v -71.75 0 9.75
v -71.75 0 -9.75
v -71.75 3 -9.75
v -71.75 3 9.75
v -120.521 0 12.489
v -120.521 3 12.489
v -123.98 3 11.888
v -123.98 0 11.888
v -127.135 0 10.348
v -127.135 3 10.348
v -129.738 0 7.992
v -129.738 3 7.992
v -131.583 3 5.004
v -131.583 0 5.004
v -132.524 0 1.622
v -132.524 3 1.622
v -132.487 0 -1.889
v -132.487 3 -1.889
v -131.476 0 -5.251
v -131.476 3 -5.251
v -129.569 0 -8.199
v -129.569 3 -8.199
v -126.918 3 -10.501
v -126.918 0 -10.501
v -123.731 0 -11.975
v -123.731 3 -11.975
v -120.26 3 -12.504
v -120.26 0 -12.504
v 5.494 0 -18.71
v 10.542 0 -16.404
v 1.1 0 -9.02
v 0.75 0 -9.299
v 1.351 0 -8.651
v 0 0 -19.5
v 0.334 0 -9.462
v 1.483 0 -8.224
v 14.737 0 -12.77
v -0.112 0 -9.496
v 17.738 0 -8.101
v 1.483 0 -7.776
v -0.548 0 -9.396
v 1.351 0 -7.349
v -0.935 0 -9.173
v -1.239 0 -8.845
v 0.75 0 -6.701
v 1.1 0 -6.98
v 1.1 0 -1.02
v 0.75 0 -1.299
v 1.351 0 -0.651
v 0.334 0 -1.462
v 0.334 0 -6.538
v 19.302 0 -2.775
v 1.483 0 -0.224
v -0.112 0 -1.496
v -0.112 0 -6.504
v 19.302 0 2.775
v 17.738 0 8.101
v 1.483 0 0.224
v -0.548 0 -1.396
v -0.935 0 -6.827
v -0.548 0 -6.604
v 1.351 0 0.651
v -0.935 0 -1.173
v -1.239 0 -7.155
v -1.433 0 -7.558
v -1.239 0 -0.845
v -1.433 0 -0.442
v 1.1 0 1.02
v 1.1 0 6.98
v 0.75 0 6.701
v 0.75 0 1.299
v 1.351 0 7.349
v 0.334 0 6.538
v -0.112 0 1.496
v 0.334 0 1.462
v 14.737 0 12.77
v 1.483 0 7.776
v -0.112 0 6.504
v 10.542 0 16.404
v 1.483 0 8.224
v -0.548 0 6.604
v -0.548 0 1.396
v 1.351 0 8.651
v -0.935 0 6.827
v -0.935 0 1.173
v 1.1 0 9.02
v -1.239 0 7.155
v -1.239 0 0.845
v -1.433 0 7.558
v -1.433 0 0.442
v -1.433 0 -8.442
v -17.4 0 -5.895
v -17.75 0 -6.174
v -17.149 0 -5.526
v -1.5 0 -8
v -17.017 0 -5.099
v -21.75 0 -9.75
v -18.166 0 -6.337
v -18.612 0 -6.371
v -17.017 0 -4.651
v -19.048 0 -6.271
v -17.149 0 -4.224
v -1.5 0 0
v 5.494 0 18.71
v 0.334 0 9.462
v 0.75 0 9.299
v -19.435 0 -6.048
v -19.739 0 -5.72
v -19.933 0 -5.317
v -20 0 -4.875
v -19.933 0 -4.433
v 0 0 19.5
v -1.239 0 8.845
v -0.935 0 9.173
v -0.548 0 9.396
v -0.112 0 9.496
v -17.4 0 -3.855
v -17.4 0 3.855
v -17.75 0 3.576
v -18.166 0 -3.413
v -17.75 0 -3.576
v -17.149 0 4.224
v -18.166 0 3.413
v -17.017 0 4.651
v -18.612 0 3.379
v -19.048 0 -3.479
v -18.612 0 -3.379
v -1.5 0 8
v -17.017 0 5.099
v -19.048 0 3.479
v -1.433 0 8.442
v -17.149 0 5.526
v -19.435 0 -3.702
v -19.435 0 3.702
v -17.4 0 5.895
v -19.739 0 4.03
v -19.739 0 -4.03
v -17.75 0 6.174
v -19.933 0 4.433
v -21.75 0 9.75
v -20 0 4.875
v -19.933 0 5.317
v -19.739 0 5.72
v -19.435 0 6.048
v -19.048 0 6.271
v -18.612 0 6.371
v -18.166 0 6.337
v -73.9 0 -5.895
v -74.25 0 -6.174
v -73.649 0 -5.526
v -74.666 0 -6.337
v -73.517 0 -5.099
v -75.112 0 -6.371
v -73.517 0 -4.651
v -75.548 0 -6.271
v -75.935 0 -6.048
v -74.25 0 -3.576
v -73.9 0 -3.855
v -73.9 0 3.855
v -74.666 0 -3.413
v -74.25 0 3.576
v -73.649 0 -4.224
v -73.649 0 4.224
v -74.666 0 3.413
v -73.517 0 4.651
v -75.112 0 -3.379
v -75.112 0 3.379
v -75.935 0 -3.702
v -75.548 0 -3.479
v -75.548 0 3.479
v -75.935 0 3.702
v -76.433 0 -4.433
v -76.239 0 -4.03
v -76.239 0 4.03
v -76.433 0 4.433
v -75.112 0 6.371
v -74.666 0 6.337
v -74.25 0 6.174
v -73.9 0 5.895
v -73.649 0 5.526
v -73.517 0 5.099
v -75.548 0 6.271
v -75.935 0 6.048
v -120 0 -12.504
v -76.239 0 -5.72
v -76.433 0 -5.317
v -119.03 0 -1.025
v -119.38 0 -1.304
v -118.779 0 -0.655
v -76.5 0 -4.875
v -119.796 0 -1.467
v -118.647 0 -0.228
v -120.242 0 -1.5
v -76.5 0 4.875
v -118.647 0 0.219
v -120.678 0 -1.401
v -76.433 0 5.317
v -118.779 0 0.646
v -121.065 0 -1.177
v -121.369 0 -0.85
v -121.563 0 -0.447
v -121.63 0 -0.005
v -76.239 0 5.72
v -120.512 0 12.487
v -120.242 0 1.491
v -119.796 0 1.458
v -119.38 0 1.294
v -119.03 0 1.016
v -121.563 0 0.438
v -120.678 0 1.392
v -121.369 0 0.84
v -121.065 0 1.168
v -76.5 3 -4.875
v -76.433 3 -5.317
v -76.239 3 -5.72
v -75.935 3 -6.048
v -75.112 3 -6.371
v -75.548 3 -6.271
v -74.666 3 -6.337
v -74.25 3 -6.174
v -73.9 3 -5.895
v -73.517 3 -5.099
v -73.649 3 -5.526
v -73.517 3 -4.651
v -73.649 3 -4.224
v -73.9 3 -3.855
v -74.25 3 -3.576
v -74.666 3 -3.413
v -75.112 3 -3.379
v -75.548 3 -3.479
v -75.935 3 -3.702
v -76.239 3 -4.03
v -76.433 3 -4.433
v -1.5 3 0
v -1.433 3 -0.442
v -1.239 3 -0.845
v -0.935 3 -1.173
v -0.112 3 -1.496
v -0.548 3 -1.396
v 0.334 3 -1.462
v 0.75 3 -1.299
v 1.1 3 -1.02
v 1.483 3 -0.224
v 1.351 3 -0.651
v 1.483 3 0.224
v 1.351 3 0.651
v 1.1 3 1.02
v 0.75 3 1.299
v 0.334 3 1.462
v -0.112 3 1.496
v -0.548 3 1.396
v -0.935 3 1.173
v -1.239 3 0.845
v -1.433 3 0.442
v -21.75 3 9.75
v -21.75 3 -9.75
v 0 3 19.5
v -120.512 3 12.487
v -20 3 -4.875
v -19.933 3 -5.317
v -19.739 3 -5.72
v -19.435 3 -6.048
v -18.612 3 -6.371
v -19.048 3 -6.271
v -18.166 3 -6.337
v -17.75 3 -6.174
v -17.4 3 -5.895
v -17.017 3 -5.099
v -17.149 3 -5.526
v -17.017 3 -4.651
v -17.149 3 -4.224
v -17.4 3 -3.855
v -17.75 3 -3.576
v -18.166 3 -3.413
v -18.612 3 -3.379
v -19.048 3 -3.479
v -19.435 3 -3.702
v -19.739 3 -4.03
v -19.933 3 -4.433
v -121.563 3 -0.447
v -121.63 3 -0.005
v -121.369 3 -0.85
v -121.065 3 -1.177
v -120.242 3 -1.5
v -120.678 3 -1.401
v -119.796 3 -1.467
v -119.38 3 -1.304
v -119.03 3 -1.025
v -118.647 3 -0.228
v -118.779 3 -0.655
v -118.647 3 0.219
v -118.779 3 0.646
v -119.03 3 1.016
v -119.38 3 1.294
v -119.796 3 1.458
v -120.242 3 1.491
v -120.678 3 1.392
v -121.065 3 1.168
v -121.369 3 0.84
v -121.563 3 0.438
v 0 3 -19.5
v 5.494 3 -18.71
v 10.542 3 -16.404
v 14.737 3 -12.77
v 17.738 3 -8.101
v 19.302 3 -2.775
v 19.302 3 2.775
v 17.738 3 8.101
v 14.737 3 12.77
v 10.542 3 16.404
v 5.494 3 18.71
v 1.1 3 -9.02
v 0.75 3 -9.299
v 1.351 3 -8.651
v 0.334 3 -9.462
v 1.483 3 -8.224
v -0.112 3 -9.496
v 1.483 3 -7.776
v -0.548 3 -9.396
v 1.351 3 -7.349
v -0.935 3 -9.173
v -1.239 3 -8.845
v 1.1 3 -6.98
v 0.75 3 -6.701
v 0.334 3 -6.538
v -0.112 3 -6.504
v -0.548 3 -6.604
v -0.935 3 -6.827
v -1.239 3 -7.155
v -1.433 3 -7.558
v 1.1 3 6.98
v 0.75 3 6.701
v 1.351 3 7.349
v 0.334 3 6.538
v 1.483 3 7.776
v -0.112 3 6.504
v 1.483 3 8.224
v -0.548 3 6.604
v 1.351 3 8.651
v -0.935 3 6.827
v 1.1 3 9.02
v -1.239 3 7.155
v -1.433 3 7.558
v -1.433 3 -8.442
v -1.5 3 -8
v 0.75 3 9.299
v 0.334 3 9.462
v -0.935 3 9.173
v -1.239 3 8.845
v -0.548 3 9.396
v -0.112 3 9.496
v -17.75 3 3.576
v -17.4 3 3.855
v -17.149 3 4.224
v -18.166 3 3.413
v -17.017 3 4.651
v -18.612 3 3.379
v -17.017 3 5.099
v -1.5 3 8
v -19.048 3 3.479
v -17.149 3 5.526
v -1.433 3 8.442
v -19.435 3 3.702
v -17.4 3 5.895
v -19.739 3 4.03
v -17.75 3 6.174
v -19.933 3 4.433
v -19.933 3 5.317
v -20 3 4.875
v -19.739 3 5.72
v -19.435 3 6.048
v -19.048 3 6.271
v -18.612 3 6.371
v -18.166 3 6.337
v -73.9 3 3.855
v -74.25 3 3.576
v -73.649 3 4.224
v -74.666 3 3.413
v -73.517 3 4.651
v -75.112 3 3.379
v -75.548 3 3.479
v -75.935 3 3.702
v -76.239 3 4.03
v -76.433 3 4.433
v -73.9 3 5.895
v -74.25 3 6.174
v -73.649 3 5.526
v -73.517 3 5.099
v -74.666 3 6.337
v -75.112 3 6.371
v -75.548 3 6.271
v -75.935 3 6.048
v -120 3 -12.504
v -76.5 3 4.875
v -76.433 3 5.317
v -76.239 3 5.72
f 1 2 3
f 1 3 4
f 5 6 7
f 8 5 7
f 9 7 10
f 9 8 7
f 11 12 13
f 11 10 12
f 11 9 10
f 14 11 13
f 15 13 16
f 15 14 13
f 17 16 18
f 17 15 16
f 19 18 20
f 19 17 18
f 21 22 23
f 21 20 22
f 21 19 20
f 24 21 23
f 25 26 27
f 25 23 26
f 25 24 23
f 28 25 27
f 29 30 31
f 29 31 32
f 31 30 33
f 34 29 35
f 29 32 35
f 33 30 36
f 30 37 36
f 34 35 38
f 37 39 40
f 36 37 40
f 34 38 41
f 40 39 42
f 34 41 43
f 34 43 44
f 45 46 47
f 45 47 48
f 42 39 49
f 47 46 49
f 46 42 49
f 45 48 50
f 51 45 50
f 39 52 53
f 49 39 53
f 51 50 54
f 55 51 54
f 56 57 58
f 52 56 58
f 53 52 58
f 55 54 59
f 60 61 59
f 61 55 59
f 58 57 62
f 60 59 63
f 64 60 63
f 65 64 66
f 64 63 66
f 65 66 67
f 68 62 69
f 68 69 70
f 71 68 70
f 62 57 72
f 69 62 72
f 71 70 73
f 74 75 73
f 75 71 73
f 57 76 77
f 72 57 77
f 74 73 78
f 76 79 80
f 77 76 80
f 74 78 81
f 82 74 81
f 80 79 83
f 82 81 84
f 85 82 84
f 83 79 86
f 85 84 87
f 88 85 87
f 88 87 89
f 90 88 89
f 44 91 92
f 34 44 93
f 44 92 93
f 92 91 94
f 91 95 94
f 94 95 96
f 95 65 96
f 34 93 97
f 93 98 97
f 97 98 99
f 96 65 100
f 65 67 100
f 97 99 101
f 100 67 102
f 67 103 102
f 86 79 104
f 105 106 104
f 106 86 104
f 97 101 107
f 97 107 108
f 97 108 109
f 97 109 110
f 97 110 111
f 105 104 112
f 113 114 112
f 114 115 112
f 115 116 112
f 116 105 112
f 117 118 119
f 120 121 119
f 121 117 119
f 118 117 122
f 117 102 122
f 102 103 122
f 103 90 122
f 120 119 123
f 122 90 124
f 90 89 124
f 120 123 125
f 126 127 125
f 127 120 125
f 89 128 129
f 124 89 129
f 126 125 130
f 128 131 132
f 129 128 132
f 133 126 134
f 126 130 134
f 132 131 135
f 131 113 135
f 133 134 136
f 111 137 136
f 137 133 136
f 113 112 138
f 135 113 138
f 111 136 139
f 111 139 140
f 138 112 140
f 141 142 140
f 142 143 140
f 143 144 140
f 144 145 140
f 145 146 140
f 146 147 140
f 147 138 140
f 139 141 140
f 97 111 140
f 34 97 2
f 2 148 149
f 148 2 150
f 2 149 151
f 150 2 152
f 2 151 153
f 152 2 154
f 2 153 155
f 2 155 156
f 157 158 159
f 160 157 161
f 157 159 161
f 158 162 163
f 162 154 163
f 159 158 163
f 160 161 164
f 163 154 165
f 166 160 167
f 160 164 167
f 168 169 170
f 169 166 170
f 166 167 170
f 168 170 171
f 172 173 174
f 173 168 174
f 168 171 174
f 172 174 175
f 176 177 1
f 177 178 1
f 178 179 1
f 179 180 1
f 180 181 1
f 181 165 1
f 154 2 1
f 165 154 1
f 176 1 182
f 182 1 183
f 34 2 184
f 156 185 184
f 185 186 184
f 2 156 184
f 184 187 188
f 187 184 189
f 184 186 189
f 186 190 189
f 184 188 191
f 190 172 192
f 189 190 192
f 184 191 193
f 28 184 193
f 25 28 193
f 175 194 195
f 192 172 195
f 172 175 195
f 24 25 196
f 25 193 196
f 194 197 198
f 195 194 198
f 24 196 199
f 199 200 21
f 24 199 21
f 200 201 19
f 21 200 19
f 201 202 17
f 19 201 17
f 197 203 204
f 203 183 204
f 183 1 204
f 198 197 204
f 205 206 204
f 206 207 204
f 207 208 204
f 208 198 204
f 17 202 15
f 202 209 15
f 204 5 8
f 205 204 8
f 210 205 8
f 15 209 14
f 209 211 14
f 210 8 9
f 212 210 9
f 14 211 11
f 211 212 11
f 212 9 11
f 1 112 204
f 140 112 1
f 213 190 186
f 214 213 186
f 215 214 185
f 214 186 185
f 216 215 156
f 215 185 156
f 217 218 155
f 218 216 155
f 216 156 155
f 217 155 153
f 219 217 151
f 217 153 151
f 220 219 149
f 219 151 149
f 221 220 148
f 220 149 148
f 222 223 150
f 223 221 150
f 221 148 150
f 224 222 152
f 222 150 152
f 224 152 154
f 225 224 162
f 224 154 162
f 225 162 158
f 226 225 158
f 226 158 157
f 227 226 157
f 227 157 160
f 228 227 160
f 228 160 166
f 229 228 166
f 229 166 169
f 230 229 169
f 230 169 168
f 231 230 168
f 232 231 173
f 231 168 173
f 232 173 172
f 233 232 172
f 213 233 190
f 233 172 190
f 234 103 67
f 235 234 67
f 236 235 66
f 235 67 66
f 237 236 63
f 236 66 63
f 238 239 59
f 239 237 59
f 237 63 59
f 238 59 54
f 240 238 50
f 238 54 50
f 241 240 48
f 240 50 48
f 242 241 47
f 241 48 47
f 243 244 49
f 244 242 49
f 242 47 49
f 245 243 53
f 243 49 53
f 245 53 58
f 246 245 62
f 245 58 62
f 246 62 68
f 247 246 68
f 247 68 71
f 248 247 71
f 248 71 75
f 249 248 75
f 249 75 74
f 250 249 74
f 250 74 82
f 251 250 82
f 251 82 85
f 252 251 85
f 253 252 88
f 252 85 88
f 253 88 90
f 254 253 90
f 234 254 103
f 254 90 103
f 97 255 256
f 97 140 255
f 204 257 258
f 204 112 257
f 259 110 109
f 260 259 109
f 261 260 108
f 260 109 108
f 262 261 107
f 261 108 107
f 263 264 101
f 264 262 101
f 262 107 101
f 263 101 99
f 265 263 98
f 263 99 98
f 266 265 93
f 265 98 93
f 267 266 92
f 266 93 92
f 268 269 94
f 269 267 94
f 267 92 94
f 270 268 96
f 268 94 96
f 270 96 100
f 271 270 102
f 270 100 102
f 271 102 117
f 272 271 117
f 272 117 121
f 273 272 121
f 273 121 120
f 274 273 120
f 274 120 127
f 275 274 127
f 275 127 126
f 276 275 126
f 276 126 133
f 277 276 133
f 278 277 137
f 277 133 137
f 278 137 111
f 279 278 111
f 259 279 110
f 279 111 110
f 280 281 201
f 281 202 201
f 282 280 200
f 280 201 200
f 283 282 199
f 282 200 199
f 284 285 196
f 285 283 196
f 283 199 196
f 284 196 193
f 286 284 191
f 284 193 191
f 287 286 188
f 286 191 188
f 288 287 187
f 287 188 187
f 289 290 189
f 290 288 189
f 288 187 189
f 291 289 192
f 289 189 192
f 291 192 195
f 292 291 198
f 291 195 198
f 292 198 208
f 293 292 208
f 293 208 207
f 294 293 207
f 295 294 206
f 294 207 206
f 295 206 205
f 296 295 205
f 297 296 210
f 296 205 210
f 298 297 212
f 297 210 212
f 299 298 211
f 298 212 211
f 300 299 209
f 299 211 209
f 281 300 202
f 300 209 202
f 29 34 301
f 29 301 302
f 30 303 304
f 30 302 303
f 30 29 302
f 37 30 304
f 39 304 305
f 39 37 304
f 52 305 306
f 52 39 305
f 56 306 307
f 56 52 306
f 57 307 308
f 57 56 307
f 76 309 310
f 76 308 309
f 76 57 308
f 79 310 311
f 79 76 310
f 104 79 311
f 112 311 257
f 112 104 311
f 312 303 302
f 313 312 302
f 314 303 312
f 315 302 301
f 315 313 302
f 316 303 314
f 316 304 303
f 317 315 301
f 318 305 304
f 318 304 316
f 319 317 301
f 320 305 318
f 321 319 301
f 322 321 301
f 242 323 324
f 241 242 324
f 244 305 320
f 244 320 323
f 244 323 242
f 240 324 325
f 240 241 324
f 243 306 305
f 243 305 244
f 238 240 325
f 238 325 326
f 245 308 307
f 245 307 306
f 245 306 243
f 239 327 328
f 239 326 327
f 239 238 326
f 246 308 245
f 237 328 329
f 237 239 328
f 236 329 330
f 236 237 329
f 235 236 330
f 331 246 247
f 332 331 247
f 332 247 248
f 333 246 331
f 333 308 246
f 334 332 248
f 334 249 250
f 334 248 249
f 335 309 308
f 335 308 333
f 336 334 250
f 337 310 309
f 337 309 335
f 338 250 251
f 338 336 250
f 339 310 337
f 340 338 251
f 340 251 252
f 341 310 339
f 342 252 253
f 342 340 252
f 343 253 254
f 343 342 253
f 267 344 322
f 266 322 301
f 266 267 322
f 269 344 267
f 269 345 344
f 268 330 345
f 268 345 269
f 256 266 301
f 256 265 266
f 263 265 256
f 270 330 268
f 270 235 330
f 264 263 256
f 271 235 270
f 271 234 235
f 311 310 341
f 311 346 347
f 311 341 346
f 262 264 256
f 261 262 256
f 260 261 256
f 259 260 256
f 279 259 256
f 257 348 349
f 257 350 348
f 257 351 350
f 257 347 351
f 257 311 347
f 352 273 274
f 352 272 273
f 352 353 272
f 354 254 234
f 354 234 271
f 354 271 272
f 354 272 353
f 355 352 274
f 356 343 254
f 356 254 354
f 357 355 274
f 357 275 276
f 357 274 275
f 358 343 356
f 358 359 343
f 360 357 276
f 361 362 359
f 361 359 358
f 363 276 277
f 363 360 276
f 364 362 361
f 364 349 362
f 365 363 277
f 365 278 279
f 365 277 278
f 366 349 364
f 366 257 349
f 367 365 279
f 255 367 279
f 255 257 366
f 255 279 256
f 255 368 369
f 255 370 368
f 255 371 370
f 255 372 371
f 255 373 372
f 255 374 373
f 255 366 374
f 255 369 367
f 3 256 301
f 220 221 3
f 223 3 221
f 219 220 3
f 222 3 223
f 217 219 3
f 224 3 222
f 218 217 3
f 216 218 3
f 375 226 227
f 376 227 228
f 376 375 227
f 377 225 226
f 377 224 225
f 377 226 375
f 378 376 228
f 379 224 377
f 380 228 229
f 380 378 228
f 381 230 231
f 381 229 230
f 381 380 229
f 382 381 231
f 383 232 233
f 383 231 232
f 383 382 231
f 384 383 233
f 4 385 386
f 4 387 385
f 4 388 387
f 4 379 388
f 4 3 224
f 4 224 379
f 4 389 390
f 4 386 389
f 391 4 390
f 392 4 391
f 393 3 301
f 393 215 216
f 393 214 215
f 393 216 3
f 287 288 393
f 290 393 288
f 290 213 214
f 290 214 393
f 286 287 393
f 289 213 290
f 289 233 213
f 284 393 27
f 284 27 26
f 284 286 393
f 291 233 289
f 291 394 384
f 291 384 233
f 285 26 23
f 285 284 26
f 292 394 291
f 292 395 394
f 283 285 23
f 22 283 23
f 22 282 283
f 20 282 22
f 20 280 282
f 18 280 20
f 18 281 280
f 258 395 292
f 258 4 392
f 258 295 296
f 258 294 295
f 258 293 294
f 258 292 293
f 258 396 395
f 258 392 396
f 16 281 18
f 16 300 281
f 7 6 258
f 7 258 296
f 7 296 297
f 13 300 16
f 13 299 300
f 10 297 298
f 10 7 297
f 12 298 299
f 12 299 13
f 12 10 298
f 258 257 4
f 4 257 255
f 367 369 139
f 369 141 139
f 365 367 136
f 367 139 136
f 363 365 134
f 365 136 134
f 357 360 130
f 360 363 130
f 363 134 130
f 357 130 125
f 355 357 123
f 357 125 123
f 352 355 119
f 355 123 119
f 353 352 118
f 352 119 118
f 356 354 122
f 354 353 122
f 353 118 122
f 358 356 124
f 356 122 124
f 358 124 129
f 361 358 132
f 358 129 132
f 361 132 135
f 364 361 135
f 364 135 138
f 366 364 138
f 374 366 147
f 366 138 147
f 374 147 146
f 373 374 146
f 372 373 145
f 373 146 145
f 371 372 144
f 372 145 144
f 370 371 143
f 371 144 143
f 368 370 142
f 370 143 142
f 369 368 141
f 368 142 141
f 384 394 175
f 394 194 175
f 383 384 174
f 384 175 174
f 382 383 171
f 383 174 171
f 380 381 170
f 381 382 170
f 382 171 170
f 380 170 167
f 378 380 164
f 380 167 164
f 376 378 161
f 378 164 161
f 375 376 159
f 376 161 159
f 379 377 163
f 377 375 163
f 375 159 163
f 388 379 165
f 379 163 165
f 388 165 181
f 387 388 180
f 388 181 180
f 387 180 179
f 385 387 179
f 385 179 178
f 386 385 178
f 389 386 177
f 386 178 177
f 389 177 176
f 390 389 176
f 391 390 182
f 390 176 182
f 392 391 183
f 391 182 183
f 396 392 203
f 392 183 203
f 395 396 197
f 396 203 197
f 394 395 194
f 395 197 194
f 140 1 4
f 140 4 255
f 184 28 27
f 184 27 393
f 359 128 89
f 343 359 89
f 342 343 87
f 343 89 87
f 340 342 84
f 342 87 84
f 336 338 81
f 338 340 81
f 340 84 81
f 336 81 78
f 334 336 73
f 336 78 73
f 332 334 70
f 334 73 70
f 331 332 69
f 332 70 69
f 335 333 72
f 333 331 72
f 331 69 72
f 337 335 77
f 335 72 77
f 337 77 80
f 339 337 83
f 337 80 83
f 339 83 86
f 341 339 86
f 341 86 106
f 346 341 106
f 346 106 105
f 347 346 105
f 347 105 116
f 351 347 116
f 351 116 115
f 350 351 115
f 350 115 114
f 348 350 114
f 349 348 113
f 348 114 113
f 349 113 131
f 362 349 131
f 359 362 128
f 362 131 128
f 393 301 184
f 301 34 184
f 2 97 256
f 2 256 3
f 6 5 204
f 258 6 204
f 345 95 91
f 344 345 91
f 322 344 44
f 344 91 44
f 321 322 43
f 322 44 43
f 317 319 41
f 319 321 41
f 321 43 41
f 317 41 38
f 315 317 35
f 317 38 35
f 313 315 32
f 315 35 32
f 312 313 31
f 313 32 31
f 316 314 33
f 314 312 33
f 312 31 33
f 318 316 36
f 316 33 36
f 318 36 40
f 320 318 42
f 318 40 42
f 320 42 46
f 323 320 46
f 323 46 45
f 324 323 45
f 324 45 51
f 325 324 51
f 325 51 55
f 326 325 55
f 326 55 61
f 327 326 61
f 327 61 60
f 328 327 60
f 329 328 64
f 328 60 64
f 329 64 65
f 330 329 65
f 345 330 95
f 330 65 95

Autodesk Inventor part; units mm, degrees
ref_plane "YZ Plane" through (0, 0, 0) normal (1, 0, 0) x (0, 1, 0)
ref_plane "XZ Plane" through (0, 0, 0) normal (0, 1, 0) x (-1, 0, 0)
ref_plane "XY Plane" through (0, 0, 0) normal (0, 0, 1) x (1, 0, 0)
sketch "Boceto1" plane through (0, 0, 0) normal (0, 1, 0) x (-1, 0, 0)
  arc A0 (120.2602, -12.5039) -> (120.5206, 12.4893) centre (120.13, -0.0046) ccw
  line L0 (21.75, -9.75) -> (71.75, -9.75)
  line L1 (71.75, -9.75) -> (71.75, 9.75)
  line L2 (71.75, 9.75) -> (21.75, 9.75)
  line L3 (21.75, 9.75) -> (21.75, -9.75)
  circle A1 centre (75, 4.875) radius 1.5
  circle A2 centre (75, -4.875) radius 1.5
  circle A3 centre (18.5, 4.875) radius 1.5
  circle A4 centre (18.5, -4.875) radius 1.5
  line L4 (0, 19.5) -> (120.5119, 12.4874)
  line L5 (0, -19.5) -> (119.9998, -12.5039)
  arc A5 (0, 19.5) -> (0, -19.5) centre (0, 0) ccw
  circle A6 centre (120.13, -0.0046) radius 1.5
  circle A7 centre (0, 0) radius 1.5
  circle A8 centre (0, -8) radius 1.5
  circle A9 centre (0, 8) radius 1.5
  line L6 (120.2602, -12.5039) -> (119.9998, -12.5039)
  line L7 (120.5206, 12.4893) -> (120.5119, 12.4874)
  dimension "d107" = 3
  dimension "d108" = 3
  dimension "d110" = 3
  dimension "d112" = 3
extrude "Extrusión1" add sketch "Boceto1" along normal blind 3
properties part number "brazo1"
